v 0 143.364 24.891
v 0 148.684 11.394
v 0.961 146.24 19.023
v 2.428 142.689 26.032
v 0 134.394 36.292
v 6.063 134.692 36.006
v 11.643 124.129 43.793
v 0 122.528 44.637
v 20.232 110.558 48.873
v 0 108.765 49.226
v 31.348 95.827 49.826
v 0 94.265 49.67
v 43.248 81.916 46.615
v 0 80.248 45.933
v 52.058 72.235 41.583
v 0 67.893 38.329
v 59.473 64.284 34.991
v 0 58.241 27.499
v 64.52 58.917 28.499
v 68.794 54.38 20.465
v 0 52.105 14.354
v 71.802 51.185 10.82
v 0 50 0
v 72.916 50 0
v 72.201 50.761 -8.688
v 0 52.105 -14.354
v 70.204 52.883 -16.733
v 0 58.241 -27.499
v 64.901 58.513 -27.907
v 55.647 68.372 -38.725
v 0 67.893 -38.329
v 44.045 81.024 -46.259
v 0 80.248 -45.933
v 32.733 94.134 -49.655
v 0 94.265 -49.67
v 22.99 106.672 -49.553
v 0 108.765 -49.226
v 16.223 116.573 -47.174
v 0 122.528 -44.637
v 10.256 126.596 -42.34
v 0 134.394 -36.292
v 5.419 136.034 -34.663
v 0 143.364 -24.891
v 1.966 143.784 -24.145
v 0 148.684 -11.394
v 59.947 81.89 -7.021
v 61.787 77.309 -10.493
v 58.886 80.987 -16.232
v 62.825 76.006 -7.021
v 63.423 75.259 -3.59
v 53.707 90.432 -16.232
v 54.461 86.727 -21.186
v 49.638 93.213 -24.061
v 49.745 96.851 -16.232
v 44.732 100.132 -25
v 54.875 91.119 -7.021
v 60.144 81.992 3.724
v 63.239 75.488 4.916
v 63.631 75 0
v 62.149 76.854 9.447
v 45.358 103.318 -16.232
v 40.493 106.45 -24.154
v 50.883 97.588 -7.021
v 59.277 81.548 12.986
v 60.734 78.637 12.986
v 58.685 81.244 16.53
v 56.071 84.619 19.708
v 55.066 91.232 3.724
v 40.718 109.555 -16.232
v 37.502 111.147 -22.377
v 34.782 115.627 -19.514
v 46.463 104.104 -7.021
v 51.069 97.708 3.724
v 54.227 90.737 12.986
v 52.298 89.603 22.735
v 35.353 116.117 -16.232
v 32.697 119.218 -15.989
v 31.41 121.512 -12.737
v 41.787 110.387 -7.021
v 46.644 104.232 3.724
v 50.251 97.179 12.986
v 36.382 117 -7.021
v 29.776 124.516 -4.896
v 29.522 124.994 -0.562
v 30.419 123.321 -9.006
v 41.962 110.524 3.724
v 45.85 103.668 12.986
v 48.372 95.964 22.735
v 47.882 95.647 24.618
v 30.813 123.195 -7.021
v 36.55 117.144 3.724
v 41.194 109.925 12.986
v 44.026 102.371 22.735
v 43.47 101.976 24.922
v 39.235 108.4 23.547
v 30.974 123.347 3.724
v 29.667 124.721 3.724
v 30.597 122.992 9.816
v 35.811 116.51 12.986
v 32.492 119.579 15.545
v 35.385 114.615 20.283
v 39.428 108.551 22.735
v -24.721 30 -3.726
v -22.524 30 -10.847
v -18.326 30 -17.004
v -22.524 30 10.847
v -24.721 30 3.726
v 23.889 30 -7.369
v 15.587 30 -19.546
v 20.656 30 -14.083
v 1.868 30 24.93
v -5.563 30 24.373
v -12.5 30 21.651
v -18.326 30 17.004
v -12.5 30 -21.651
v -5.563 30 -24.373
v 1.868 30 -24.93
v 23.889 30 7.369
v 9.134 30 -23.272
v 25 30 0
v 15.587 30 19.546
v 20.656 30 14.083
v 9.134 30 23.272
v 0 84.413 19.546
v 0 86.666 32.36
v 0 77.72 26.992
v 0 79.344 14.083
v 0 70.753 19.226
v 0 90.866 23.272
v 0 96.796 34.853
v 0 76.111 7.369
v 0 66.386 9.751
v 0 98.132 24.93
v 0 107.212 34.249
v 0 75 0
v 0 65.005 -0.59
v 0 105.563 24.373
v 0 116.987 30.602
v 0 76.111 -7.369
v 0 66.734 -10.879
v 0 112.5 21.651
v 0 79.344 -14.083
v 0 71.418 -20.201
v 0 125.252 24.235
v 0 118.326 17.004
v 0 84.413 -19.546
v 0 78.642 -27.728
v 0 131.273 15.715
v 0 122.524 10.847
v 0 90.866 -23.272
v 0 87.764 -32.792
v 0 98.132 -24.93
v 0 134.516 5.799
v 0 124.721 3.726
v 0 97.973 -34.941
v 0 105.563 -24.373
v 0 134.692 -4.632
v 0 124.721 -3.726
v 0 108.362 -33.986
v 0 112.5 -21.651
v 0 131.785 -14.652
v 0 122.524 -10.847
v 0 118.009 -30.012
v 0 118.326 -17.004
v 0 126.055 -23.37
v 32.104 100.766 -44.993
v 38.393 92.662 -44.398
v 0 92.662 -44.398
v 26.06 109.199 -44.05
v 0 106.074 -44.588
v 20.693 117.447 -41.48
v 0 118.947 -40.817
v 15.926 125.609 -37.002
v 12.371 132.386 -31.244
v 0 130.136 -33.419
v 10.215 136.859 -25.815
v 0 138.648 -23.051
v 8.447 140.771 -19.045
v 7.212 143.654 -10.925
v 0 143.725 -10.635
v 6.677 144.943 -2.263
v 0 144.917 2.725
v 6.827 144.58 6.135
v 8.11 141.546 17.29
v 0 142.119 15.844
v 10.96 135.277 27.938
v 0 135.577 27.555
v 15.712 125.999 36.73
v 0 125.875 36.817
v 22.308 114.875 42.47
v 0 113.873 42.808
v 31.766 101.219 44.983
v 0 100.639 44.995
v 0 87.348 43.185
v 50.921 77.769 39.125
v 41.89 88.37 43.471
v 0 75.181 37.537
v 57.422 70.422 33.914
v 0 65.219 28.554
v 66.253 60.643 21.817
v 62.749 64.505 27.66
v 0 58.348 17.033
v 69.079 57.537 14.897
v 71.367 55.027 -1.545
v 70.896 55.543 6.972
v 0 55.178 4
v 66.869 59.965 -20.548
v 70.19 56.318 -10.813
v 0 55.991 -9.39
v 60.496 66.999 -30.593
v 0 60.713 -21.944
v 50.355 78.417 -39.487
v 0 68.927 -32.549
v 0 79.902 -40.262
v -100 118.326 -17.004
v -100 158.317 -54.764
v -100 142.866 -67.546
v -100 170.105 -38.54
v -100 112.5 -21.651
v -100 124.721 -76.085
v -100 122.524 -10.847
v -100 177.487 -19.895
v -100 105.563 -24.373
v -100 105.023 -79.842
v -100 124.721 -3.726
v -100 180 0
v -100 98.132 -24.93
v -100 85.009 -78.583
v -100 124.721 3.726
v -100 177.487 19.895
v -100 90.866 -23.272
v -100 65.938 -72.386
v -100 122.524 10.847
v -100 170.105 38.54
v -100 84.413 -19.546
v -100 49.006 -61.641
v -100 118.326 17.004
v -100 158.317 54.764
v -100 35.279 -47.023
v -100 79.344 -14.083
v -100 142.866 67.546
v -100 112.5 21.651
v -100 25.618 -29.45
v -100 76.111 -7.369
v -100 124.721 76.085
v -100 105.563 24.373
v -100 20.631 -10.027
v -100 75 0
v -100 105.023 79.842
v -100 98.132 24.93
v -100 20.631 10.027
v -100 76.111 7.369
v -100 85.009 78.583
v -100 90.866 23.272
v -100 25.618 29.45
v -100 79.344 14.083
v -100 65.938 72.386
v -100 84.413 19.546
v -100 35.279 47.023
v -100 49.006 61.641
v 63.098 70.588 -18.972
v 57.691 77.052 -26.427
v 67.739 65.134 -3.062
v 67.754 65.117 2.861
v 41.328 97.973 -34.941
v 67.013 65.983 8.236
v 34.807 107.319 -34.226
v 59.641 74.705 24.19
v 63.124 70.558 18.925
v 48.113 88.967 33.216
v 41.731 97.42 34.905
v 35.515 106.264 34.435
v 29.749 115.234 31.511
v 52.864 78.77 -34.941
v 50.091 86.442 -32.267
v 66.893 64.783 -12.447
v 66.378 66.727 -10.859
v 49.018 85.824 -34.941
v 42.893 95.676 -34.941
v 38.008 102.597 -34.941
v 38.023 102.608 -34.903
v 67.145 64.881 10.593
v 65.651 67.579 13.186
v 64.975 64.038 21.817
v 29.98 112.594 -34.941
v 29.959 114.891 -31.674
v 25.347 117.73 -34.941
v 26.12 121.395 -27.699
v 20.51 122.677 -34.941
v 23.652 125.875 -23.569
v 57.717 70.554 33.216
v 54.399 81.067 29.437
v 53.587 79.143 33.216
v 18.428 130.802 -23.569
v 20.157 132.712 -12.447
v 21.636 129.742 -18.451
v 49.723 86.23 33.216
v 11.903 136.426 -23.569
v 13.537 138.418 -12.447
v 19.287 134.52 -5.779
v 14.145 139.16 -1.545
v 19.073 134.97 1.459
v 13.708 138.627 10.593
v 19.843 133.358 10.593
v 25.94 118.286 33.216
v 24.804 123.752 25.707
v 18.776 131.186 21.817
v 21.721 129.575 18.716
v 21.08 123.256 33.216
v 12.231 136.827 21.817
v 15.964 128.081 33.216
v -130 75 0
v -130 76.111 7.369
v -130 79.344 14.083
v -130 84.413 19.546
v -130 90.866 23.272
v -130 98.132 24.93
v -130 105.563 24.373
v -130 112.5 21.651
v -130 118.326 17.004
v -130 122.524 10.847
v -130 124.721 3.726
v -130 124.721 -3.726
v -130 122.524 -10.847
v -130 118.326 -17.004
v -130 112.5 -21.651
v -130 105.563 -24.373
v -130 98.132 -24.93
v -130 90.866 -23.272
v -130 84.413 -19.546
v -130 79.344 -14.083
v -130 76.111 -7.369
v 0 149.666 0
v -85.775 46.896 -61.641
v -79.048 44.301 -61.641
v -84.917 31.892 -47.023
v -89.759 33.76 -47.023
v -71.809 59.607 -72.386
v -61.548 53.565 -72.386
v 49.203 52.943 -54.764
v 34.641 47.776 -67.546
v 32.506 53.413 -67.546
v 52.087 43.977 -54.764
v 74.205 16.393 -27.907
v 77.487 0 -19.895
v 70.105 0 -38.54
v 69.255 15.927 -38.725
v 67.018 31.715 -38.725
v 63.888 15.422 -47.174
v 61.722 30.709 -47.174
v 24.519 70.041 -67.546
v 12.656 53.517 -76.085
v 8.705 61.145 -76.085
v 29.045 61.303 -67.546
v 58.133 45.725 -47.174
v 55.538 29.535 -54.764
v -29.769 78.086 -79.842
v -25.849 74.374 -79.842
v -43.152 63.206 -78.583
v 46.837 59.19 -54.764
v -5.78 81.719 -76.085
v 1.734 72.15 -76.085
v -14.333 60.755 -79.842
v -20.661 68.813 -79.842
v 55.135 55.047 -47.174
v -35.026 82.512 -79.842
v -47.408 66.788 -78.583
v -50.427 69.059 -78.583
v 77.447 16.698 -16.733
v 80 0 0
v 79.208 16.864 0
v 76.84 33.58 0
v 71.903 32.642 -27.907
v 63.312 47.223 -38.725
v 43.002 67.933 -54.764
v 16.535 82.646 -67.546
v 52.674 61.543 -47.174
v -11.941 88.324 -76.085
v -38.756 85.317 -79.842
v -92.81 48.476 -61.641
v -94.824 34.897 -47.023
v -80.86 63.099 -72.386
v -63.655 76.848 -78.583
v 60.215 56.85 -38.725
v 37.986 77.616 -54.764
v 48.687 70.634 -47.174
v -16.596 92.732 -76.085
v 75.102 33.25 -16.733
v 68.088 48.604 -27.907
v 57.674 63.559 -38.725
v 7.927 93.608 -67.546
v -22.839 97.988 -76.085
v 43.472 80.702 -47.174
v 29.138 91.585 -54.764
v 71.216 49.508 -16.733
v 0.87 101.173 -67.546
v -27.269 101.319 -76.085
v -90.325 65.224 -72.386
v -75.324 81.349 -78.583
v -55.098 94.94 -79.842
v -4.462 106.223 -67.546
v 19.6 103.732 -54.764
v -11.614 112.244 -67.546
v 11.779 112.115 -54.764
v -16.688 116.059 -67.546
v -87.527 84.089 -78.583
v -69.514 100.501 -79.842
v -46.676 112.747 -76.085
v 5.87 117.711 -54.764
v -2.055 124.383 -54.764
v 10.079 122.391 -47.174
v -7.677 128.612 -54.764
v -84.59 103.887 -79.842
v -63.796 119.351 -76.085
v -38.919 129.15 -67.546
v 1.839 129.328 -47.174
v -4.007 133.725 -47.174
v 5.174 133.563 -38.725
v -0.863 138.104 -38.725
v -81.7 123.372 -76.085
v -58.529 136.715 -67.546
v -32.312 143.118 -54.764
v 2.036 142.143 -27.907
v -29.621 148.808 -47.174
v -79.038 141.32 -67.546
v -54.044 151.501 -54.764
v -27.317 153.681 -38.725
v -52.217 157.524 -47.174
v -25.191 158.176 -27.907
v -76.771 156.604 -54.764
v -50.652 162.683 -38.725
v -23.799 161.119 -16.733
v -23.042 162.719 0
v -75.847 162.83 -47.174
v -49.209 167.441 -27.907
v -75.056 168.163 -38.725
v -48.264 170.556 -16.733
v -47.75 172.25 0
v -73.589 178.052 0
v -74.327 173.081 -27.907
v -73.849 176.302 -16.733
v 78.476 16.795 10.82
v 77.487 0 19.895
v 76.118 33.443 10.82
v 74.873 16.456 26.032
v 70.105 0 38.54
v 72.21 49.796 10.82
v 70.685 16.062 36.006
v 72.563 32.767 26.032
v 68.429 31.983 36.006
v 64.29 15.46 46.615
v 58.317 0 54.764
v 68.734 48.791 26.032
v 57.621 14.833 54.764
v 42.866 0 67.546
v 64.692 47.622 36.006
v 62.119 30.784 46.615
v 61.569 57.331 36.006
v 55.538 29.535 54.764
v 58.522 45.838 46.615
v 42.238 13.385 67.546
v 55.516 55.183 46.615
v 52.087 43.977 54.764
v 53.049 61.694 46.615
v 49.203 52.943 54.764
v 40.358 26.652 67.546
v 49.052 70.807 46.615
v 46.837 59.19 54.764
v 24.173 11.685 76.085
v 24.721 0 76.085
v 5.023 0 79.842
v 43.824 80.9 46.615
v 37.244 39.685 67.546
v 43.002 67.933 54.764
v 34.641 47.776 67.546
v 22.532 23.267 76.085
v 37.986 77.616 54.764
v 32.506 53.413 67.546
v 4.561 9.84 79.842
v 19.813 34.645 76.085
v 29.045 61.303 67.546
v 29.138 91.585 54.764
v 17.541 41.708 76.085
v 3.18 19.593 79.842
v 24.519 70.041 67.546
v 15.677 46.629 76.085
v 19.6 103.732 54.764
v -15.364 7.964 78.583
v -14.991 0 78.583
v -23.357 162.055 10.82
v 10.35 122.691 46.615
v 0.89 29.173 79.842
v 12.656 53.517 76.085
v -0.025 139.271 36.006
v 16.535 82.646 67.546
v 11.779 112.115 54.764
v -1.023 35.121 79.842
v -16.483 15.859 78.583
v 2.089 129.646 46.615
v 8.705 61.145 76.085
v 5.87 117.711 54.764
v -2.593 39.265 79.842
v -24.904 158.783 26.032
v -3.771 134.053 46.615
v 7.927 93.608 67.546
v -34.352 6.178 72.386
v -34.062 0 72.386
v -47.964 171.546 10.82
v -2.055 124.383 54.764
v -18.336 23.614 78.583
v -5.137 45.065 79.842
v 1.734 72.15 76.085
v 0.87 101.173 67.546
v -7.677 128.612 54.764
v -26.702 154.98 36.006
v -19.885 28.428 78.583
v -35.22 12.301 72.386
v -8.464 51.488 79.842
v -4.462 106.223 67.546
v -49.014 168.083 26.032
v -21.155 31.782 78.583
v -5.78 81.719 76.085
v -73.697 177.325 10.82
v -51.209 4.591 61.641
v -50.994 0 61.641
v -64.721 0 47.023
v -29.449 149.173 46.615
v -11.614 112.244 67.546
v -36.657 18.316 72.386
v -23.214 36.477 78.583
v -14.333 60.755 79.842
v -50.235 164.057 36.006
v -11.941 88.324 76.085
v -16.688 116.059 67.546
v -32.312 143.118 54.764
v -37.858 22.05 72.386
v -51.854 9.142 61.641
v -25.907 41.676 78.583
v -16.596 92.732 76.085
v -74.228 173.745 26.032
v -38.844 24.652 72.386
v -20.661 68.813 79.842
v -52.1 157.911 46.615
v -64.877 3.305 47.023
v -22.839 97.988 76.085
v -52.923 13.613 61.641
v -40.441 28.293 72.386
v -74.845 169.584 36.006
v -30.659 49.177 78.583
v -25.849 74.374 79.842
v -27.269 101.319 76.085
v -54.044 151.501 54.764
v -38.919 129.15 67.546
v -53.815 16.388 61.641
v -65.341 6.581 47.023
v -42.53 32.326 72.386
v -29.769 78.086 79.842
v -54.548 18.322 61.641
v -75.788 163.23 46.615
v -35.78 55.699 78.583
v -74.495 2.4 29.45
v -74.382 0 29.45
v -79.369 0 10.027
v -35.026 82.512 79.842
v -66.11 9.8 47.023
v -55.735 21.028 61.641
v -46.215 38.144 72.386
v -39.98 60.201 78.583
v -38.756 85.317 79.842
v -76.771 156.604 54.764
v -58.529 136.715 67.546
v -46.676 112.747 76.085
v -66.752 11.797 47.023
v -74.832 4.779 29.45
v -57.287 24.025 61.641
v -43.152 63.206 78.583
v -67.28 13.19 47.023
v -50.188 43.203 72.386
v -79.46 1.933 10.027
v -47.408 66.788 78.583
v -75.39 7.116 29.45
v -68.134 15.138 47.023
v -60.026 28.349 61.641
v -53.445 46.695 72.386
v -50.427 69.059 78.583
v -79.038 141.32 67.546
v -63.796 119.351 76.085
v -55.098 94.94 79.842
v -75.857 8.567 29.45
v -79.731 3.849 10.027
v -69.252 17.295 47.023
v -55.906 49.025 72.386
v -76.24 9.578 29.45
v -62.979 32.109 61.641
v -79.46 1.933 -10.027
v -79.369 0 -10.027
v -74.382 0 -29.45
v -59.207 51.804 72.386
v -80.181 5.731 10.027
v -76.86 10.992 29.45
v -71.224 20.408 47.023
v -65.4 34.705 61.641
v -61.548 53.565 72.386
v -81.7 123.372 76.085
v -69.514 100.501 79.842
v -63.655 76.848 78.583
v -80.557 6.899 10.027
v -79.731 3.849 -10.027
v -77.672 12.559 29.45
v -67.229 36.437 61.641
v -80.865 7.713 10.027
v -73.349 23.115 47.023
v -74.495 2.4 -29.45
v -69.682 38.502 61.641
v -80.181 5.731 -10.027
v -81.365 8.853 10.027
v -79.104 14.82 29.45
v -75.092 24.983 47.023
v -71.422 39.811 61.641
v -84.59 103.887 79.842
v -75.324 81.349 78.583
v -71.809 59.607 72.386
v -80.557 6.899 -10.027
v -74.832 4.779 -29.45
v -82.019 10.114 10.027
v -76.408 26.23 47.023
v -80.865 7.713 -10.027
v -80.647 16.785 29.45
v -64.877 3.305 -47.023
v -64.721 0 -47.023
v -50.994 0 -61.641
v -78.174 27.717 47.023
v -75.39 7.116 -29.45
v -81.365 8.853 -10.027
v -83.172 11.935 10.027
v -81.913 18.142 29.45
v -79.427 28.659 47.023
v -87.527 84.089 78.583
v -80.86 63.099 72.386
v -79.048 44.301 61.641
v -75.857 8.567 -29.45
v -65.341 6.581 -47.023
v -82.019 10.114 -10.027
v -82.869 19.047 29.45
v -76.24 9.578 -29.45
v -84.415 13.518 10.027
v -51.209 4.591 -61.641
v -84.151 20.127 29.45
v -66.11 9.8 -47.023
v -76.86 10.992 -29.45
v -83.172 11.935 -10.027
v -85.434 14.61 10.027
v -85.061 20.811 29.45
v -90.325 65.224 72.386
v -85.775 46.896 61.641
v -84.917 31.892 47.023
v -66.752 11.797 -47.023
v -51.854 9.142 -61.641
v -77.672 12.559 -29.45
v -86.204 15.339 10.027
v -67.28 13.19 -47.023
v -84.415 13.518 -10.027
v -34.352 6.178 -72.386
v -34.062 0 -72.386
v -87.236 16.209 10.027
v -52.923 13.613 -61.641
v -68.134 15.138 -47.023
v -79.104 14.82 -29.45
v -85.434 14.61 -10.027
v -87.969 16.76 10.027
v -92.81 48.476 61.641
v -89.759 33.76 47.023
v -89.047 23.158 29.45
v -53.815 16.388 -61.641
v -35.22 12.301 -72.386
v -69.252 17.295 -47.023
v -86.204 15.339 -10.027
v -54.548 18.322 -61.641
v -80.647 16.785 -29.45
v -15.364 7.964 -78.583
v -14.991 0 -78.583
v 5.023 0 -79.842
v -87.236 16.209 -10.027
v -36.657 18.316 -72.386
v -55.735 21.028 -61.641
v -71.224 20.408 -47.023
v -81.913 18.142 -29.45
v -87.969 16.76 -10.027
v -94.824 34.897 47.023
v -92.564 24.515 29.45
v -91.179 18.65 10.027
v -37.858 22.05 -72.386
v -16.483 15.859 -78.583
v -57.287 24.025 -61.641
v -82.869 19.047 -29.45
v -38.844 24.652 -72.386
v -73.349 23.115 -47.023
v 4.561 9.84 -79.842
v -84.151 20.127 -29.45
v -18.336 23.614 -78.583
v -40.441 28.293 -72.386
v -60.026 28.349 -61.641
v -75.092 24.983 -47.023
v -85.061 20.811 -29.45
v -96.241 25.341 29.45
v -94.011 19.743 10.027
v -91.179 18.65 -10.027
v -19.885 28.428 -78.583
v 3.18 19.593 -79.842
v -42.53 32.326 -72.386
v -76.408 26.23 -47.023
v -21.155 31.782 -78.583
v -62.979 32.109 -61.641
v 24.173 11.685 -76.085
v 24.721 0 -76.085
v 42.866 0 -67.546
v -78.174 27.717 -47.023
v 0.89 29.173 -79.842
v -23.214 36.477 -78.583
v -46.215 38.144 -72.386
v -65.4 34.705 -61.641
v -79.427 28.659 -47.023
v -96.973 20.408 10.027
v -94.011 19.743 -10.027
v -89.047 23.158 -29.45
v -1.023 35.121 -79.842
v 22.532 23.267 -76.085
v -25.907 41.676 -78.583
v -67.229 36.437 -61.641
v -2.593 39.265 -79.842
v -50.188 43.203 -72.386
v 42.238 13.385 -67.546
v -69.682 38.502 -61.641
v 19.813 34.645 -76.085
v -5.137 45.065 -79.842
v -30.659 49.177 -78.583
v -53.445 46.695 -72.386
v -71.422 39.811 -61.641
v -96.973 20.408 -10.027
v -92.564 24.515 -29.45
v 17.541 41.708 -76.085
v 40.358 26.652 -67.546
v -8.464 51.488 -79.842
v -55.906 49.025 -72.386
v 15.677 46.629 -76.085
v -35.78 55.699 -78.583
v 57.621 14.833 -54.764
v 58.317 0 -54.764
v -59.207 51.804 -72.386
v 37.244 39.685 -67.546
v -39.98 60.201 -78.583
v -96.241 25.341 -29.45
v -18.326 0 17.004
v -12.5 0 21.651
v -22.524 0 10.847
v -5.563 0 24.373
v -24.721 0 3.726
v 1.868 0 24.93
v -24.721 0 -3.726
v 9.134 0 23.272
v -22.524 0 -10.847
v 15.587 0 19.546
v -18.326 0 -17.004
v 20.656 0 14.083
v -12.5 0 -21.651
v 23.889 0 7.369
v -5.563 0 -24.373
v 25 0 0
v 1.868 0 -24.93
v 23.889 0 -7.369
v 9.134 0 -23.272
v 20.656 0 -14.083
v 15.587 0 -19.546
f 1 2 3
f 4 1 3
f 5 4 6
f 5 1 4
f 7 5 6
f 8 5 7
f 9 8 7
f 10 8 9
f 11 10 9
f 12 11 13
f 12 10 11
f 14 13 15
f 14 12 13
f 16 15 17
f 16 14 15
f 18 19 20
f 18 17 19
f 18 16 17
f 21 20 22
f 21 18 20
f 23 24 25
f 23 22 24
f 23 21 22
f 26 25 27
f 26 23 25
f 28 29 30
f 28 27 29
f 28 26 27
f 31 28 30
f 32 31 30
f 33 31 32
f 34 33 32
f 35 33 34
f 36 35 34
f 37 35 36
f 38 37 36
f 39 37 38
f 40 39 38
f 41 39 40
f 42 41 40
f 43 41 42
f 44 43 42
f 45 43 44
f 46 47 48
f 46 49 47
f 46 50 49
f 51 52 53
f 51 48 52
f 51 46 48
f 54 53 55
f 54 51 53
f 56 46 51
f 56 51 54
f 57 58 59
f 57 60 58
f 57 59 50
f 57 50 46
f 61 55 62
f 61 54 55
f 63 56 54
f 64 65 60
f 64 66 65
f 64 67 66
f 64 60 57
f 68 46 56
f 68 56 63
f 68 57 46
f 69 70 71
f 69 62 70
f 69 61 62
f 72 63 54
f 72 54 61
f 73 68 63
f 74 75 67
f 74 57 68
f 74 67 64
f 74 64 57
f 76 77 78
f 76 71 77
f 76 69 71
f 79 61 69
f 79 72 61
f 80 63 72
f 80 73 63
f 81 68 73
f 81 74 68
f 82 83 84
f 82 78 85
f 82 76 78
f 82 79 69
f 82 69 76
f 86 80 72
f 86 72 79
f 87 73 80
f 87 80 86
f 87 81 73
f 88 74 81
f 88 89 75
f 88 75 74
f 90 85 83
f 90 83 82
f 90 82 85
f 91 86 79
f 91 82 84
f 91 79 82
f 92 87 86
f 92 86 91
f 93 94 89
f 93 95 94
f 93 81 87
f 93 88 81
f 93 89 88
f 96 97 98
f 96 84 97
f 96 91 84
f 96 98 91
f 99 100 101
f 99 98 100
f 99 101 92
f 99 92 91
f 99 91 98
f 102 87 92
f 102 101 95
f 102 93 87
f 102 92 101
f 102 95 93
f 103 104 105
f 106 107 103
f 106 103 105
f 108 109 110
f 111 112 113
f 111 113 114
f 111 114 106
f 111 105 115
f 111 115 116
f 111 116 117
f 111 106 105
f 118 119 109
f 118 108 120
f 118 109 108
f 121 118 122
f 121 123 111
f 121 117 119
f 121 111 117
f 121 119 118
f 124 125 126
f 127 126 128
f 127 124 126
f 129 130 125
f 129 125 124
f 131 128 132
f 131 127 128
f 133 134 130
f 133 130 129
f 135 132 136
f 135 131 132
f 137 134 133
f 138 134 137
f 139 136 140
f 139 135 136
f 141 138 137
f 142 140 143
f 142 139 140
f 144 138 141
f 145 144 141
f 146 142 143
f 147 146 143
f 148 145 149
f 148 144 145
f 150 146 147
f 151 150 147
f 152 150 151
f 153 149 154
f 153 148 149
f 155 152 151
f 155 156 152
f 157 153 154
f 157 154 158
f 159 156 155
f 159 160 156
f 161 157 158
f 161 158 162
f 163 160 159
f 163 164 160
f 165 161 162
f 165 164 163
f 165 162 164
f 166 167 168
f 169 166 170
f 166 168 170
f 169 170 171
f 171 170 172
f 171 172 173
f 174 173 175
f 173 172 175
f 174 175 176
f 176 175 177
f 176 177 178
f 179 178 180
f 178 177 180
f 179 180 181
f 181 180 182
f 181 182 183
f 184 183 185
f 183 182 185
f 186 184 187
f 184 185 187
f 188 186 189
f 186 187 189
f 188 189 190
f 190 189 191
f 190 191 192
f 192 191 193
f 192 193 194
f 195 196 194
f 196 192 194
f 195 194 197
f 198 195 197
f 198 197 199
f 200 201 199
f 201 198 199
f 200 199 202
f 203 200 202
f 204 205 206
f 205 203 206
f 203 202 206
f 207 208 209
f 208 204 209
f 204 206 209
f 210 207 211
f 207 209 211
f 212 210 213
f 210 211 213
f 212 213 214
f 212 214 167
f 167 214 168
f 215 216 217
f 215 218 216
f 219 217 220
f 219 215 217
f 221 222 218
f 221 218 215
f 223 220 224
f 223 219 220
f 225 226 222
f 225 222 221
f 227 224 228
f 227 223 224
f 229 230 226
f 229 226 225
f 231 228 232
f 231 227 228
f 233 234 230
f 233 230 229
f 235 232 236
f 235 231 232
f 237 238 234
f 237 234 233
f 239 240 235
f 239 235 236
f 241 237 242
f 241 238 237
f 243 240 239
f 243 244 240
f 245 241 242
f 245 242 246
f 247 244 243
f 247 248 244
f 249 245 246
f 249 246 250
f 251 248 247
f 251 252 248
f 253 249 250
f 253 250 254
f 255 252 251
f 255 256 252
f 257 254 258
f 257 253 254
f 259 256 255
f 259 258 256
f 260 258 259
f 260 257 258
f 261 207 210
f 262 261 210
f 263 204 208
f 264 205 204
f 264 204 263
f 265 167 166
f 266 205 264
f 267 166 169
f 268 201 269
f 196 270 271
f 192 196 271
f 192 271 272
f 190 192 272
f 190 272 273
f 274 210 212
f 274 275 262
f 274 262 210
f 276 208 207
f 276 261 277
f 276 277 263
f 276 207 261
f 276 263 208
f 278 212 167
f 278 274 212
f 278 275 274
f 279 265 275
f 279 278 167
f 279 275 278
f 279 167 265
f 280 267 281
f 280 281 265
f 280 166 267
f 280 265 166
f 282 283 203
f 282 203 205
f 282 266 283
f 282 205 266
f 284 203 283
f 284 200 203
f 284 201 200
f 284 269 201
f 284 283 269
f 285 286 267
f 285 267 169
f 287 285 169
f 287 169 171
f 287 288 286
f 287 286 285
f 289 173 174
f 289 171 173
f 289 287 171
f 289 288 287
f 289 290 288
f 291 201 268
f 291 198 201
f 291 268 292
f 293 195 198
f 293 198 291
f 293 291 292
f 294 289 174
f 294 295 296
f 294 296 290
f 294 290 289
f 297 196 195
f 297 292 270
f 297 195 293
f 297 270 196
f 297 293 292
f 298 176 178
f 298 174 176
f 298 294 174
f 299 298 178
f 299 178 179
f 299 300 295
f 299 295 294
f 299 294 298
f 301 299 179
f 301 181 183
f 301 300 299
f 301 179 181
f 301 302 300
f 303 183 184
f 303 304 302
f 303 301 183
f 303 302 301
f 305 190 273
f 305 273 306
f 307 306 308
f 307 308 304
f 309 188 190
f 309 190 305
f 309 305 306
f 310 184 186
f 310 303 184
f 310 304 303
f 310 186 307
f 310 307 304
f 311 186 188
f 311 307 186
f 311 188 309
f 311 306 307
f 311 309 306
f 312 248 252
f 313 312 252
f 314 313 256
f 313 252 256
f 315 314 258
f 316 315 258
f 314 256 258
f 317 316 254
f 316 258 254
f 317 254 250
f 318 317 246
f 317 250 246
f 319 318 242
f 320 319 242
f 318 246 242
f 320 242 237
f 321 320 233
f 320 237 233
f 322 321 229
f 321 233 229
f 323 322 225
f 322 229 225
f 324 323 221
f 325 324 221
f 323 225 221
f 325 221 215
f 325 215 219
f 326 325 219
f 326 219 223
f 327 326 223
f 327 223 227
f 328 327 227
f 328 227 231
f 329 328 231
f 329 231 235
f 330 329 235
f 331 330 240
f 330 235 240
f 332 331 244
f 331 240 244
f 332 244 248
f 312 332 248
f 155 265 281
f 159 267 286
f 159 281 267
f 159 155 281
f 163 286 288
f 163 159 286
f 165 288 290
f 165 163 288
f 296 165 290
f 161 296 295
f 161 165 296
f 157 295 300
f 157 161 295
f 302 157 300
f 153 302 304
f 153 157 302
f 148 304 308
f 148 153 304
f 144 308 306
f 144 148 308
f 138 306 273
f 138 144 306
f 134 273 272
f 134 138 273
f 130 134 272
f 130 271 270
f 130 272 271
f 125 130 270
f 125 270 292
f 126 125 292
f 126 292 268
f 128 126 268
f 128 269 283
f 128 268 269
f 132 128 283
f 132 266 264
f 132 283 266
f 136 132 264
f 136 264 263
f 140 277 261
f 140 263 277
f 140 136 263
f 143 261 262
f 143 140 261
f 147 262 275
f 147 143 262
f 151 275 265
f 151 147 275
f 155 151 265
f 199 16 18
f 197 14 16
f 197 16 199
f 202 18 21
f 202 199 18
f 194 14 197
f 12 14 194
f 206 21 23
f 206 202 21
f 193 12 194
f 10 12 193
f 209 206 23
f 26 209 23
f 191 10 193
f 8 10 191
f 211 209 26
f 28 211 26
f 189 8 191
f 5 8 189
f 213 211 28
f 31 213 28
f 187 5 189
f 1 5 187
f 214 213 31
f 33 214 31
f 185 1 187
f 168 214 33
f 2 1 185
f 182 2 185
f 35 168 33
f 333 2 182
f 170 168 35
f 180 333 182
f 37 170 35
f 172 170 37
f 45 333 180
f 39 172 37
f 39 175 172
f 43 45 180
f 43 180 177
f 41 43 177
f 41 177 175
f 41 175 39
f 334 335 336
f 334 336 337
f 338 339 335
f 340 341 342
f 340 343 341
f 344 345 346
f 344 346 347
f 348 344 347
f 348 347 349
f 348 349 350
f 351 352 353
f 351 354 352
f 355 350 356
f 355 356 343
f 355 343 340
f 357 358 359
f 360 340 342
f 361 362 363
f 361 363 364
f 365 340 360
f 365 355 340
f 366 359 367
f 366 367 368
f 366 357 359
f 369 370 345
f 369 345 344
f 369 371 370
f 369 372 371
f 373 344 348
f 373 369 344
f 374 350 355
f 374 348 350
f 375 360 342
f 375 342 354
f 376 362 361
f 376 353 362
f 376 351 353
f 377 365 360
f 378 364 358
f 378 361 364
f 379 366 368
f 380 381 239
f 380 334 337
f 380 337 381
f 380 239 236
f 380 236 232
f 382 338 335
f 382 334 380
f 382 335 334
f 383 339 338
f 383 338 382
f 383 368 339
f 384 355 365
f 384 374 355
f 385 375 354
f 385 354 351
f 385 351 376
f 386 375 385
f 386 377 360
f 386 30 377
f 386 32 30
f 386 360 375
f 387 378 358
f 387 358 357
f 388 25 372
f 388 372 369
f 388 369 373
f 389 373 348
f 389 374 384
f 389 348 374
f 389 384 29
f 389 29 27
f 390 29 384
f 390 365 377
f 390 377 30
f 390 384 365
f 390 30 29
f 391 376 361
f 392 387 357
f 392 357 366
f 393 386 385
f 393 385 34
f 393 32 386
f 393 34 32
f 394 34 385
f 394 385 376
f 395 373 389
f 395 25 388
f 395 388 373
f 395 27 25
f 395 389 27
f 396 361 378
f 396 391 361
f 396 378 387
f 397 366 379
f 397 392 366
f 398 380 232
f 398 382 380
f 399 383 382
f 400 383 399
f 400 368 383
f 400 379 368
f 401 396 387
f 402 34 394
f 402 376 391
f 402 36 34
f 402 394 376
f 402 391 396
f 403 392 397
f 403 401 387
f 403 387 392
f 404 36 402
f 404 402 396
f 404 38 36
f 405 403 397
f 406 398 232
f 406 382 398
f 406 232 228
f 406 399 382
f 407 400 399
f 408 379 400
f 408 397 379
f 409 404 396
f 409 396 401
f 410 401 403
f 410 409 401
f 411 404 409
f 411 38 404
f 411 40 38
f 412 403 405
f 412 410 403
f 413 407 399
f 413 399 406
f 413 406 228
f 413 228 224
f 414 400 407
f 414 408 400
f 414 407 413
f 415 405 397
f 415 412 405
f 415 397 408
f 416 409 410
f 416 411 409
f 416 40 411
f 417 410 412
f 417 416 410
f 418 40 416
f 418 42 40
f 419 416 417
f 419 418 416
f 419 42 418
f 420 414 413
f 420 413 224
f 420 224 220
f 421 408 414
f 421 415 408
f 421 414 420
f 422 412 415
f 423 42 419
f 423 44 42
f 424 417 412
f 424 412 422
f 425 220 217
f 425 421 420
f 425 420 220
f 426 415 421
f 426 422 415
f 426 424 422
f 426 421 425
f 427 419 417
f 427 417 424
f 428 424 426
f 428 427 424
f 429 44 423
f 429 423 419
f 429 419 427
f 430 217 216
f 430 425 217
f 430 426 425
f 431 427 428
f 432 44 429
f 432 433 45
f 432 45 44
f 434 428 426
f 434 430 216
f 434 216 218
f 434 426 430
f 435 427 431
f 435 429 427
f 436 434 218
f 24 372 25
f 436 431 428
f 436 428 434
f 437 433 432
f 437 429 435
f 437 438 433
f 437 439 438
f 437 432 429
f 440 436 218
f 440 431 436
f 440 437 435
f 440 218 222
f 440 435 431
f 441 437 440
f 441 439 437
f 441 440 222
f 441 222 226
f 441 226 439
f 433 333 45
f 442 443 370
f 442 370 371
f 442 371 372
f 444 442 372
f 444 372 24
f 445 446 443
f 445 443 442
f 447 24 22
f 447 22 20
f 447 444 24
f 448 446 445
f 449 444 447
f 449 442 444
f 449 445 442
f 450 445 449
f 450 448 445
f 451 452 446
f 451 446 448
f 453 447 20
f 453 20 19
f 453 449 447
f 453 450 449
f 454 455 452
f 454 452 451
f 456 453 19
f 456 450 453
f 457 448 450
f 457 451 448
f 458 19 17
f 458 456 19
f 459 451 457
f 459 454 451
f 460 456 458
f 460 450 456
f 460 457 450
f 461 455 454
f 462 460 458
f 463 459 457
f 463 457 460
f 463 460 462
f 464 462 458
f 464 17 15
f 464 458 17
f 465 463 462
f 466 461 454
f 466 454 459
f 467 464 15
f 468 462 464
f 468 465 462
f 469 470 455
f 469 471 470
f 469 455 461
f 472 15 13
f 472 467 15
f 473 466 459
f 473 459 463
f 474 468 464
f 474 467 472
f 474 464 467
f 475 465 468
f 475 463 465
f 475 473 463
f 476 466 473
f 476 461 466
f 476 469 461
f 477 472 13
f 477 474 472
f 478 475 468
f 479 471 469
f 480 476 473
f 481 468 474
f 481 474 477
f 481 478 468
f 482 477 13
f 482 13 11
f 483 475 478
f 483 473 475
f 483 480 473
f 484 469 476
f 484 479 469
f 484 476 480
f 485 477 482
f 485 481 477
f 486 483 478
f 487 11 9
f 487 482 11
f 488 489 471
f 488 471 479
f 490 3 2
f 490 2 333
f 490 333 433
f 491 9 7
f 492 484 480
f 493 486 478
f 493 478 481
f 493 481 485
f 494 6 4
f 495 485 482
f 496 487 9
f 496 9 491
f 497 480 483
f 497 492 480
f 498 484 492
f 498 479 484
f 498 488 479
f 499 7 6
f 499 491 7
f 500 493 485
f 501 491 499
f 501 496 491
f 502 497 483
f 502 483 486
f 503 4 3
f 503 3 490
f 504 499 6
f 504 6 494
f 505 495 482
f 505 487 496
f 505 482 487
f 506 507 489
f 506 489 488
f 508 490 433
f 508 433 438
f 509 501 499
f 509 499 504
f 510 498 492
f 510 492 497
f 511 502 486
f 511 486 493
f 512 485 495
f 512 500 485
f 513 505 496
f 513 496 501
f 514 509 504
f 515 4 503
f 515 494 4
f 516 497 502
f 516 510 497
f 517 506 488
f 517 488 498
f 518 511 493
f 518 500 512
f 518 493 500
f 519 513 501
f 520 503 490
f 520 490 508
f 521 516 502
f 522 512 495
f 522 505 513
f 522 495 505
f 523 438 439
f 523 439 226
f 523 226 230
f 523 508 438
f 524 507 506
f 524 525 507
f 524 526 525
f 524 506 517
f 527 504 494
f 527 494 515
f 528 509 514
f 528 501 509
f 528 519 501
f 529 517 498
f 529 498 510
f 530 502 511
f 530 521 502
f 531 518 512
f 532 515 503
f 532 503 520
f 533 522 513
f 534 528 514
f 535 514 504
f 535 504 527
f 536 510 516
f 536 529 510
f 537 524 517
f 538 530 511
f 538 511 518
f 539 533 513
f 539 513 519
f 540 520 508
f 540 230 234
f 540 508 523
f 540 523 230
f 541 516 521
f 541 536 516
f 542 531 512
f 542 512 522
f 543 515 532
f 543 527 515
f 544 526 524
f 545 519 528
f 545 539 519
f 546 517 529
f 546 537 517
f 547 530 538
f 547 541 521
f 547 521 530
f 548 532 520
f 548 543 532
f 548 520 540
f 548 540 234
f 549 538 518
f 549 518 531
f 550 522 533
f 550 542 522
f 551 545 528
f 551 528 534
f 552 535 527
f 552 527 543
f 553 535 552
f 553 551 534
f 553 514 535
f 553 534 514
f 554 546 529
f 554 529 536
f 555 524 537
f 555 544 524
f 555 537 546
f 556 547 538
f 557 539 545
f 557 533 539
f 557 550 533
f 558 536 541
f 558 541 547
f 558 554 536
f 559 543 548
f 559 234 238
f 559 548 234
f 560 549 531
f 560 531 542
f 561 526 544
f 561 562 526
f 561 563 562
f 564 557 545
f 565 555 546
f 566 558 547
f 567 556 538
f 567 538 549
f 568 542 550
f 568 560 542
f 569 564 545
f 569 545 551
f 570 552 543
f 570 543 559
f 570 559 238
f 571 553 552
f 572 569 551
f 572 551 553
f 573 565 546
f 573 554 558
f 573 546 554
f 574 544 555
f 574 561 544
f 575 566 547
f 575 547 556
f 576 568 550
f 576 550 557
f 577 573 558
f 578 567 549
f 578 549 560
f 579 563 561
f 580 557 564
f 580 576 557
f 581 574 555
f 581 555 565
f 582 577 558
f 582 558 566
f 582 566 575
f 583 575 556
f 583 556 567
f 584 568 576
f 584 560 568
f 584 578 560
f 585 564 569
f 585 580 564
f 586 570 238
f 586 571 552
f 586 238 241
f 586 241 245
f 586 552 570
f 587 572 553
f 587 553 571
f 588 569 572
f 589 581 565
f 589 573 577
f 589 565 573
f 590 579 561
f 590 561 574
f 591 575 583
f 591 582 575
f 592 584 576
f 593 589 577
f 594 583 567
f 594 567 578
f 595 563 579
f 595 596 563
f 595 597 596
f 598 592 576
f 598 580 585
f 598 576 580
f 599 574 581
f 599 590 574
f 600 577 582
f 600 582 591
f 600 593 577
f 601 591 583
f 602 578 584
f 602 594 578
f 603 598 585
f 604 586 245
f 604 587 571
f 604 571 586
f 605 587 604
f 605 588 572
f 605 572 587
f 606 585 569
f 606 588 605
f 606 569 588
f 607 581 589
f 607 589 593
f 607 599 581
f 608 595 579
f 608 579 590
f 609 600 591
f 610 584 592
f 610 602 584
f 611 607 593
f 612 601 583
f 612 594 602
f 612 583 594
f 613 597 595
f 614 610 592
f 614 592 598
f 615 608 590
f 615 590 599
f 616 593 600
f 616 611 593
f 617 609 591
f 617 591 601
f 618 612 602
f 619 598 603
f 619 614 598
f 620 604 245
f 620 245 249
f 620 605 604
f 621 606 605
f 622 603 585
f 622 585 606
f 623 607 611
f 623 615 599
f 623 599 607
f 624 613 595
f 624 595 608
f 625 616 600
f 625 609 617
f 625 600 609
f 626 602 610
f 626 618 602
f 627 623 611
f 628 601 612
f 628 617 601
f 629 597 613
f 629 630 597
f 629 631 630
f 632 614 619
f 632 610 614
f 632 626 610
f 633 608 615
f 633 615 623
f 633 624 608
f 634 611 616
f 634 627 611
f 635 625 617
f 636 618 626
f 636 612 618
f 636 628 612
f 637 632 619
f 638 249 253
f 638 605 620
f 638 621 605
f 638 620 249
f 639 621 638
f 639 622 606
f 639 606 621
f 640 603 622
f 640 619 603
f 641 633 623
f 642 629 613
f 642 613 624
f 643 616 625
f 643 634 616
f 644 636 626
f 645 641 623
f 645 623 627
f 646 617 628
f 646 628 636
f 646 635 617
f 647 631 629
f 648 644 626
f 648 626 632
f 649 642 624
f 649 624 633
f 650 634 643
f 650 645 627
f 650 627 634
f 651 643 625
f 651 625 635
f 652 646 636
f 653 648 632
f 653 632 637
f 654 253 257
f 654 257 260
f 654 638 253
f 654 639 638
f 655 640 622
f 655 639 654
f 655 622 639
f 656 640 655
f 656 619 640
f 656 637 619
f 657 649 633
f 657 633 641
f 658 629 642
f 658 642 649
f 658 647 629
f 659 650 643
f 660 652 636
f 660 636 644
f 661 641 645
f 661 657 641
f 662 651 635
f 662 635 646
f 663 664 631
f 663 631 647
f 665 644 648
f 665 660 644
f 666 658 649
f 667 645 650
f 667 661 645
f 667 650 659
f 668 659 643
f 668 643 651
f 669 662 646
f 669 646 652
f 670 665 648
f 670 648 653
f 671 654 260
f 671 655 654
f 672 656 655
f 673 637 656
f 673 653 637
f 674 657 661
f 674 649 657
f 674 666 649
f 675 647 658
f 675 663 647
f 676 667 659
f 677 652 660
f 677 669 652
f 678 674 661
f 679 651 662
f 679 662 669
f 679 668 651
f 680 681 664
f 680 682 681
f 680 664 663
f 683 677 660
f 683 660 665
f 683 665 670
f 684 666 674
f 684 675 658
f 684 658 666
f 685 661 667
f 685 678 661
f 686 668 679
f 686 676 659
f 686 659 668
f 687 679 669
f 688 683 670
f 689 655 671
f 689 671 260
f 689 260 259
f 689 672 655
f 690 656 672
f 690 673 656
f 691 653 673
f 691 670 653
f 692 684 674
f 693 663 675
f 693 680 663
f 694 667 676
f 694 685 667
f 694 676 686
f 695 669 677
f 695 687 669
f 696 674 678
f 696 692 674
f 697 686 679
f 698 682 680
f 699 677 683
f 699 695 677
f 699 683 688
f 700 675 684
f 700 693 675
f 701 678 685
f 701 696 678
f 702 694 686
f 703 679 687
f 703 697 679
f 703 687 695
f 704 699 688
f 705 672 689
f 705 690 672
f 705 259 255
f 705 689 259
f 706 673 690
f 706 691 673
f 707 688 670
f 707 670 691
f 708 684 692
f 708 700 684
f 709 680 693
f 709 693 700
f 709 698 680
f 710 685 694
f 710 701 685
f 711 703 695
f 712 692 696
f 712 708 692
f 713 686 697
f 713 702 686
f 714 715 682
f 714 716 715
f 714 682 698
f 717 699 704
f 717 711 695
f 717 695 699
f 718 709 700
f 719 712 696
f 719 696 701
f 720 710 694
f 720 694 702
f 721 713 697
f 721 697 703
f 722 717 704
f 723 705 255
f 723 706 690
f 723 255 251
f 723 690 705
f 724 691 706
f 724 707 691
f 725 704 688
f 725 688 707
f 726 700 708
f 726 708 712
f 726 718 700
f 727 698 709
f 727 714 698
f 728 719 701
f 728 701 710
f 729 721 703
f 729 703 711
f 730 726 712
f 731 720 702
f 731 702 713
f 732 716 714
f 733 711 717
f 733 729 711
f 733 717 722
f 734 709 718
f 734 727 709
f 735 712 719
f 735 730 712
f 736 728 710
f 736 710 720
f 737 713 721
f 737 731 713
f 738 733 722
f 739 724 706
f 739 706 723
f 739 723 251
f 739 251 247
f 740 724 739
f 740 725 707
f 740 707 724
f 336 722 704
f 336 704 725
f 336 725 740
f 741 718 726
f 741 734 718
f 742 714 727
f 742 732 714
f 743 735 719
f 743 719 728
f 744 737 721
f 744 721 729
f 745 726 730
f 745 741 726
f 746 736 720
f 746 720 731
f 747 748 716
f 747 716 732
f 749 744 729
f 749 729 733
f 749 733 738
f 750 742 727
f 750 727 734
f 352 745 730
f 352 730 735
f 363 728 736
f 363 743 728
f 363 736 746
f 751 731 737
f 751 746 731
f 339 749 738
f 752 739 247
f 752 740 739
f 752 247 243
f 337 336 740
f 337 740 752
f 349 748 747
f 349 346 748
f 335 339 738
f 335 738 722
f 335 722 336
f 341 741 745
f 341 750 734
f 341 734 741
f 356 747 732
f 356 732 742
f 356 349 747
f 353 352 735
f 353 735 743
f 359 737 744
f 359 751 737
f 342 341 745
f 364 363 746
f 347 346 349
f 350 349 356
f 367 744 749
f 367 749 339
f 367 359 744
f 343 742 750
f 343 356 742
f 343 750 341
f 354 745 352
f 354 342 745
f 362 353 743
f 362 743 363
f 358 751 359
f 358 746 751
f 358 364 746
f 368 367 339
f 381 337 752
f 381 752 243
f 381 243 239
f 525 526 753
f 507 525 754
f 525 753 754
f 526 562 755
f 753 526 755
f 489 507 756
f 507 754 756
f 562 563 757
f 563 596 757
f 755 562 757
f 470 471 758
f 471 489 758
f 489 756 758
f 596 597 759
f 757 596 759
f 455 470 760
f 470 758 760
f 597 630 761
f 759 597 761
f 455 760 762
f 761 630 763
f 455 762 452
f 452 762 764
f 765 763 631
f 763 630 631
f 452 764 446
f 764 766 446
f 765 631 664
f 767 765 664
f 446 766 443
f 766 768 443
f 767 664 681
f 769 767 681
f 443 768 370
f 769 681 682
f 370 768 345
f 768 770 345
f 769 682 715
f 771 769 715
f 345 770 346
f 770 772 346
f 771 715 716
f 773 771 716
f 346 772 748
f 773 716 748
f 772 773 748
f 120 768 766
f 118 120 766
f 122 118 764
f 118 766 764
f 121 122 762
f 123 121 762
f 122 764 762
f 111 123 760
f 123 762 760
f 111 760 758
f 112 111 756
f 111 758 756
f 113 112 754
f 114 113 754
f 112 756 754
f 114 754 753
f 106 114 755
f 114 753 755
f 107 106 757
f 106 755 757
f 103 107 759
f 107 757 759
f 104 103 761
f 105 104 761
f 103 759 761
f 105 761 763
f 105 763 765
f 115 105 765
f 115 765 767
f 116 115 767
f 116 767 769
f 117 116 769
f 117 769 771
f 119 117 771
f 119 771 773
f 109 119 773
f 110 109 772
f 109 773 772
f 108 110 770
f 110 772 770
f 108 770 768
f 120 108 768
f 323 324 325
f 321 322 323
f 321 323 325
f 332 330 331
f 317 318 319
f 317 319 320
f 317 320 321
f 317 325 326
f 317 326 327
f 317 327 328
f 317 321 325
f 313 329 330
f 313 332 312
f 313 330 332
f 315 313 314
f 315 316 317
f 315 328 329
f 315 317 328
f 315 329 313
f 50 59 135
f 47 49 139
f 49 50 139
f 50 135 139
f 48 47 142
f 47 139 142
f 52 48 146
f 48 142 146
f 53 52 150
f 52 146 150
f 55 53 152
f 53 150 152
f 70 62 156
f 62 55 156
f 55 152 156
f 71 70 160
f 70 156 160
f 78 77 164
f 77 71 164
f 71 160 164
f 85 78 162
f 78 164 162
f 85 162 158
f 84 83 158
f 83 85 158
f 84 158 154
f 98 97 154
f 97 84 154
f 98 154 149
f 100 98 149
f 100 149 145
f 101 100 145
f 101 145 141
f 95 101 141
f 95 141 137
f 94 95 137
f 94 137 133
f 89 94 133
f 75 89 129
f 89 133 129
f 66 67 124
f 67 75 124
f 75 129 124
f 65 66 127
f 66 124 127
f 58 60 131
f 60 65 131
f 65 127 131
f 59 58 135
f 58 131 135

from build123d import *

# Parameters (mm, degrees)
SWEEP2_PROFILE_R    = 80
SKETCH11_R          = 25
CUT_EXTRUDE1_DEPTH  = 30
SKETCH12_R          = 25
BOSS_EXTRUDE1_DEPTH = 30
SKETCH13_R          = 50
SKETCH13_R_2        = 45
SKETCH13_R_3        = 35
SKETCH13_R_4        = 25
CUT_EXTRUDE2_DEPTH  = 237.008474534


with BuildPart() as part:
    # Sweep2: sweep along a path in Sketch1
    with BuildLine(Plane.XY) as sweep2_path:
        ThreePointArc((0, 0), (-29.289321881, 70.710678119), (-100, 100))
    # Sweep2 profile (on start of the path) → Sweep2 (sweep)
    with BuildSketch(Plane(origin=(0, 0, 0), x_dir=(1, 0, 0), z_dir=(0, 1, 0))):
        Circle(SWEEP2_PROFILE_R)
    sweep(path=sweep2_path.line)

    # Sketch11 → Cut-Extrude1 (cut)
    with BuildSketch(Plane.XZ):
        Circle(SKETCH11_R)
    extrude(amount=-CUT_EXTRUDE1_DEPTH, mode=Mode.SUBTRACT)

    # Sketch12 → Boss-Extrude1 (add)
    with BuildSketch(Plane.ZY.offset(100)):
        with Locations(Location((0, 100, 0), (0, 0, 270))):
            Circle(SKETCH12_R)
    extrude(amount=BOSS_EXTRUDE1_DEPTH)

    # Sketch13 → Cut-Extrude2 (cut, through all)
    # profile 1 of 2: a face of its own
    with BuildSketch(Plane(origin=(0, 0, 0), x_dir=(0, 0, -1), z_dir=(1, 0, 0))):
        with Locations((0, 100)):
            Circle(SKETCH13_R)
        with Locations(Location((0, 100, 0), (0, 0, 350.615107279))):
            Circle(SKETCH13_R_2, mode=Mode.SUBTRACT)
    # profile 2 of 2: a face of its own
    with BuildSketch(Plane(origin=(0, 0, 0), x_dir=(0, 0, -1), z_dir=(1, 0, 0))):
        with Locations(Location((0, 100, 0), (0, 0, 356.680271872))):
            Circle(SKETCH13_R_3)
        with Locations(Location((0, 100, 0), (0, 0, 270))):
            Circle(SKETCH13_R_4, mode=Mode.SUBTRACT)
    extrude(amount=CUT_EXTRUDE2_DEPTH, mode=Mode.SUBTRACT)


solid = part.part
